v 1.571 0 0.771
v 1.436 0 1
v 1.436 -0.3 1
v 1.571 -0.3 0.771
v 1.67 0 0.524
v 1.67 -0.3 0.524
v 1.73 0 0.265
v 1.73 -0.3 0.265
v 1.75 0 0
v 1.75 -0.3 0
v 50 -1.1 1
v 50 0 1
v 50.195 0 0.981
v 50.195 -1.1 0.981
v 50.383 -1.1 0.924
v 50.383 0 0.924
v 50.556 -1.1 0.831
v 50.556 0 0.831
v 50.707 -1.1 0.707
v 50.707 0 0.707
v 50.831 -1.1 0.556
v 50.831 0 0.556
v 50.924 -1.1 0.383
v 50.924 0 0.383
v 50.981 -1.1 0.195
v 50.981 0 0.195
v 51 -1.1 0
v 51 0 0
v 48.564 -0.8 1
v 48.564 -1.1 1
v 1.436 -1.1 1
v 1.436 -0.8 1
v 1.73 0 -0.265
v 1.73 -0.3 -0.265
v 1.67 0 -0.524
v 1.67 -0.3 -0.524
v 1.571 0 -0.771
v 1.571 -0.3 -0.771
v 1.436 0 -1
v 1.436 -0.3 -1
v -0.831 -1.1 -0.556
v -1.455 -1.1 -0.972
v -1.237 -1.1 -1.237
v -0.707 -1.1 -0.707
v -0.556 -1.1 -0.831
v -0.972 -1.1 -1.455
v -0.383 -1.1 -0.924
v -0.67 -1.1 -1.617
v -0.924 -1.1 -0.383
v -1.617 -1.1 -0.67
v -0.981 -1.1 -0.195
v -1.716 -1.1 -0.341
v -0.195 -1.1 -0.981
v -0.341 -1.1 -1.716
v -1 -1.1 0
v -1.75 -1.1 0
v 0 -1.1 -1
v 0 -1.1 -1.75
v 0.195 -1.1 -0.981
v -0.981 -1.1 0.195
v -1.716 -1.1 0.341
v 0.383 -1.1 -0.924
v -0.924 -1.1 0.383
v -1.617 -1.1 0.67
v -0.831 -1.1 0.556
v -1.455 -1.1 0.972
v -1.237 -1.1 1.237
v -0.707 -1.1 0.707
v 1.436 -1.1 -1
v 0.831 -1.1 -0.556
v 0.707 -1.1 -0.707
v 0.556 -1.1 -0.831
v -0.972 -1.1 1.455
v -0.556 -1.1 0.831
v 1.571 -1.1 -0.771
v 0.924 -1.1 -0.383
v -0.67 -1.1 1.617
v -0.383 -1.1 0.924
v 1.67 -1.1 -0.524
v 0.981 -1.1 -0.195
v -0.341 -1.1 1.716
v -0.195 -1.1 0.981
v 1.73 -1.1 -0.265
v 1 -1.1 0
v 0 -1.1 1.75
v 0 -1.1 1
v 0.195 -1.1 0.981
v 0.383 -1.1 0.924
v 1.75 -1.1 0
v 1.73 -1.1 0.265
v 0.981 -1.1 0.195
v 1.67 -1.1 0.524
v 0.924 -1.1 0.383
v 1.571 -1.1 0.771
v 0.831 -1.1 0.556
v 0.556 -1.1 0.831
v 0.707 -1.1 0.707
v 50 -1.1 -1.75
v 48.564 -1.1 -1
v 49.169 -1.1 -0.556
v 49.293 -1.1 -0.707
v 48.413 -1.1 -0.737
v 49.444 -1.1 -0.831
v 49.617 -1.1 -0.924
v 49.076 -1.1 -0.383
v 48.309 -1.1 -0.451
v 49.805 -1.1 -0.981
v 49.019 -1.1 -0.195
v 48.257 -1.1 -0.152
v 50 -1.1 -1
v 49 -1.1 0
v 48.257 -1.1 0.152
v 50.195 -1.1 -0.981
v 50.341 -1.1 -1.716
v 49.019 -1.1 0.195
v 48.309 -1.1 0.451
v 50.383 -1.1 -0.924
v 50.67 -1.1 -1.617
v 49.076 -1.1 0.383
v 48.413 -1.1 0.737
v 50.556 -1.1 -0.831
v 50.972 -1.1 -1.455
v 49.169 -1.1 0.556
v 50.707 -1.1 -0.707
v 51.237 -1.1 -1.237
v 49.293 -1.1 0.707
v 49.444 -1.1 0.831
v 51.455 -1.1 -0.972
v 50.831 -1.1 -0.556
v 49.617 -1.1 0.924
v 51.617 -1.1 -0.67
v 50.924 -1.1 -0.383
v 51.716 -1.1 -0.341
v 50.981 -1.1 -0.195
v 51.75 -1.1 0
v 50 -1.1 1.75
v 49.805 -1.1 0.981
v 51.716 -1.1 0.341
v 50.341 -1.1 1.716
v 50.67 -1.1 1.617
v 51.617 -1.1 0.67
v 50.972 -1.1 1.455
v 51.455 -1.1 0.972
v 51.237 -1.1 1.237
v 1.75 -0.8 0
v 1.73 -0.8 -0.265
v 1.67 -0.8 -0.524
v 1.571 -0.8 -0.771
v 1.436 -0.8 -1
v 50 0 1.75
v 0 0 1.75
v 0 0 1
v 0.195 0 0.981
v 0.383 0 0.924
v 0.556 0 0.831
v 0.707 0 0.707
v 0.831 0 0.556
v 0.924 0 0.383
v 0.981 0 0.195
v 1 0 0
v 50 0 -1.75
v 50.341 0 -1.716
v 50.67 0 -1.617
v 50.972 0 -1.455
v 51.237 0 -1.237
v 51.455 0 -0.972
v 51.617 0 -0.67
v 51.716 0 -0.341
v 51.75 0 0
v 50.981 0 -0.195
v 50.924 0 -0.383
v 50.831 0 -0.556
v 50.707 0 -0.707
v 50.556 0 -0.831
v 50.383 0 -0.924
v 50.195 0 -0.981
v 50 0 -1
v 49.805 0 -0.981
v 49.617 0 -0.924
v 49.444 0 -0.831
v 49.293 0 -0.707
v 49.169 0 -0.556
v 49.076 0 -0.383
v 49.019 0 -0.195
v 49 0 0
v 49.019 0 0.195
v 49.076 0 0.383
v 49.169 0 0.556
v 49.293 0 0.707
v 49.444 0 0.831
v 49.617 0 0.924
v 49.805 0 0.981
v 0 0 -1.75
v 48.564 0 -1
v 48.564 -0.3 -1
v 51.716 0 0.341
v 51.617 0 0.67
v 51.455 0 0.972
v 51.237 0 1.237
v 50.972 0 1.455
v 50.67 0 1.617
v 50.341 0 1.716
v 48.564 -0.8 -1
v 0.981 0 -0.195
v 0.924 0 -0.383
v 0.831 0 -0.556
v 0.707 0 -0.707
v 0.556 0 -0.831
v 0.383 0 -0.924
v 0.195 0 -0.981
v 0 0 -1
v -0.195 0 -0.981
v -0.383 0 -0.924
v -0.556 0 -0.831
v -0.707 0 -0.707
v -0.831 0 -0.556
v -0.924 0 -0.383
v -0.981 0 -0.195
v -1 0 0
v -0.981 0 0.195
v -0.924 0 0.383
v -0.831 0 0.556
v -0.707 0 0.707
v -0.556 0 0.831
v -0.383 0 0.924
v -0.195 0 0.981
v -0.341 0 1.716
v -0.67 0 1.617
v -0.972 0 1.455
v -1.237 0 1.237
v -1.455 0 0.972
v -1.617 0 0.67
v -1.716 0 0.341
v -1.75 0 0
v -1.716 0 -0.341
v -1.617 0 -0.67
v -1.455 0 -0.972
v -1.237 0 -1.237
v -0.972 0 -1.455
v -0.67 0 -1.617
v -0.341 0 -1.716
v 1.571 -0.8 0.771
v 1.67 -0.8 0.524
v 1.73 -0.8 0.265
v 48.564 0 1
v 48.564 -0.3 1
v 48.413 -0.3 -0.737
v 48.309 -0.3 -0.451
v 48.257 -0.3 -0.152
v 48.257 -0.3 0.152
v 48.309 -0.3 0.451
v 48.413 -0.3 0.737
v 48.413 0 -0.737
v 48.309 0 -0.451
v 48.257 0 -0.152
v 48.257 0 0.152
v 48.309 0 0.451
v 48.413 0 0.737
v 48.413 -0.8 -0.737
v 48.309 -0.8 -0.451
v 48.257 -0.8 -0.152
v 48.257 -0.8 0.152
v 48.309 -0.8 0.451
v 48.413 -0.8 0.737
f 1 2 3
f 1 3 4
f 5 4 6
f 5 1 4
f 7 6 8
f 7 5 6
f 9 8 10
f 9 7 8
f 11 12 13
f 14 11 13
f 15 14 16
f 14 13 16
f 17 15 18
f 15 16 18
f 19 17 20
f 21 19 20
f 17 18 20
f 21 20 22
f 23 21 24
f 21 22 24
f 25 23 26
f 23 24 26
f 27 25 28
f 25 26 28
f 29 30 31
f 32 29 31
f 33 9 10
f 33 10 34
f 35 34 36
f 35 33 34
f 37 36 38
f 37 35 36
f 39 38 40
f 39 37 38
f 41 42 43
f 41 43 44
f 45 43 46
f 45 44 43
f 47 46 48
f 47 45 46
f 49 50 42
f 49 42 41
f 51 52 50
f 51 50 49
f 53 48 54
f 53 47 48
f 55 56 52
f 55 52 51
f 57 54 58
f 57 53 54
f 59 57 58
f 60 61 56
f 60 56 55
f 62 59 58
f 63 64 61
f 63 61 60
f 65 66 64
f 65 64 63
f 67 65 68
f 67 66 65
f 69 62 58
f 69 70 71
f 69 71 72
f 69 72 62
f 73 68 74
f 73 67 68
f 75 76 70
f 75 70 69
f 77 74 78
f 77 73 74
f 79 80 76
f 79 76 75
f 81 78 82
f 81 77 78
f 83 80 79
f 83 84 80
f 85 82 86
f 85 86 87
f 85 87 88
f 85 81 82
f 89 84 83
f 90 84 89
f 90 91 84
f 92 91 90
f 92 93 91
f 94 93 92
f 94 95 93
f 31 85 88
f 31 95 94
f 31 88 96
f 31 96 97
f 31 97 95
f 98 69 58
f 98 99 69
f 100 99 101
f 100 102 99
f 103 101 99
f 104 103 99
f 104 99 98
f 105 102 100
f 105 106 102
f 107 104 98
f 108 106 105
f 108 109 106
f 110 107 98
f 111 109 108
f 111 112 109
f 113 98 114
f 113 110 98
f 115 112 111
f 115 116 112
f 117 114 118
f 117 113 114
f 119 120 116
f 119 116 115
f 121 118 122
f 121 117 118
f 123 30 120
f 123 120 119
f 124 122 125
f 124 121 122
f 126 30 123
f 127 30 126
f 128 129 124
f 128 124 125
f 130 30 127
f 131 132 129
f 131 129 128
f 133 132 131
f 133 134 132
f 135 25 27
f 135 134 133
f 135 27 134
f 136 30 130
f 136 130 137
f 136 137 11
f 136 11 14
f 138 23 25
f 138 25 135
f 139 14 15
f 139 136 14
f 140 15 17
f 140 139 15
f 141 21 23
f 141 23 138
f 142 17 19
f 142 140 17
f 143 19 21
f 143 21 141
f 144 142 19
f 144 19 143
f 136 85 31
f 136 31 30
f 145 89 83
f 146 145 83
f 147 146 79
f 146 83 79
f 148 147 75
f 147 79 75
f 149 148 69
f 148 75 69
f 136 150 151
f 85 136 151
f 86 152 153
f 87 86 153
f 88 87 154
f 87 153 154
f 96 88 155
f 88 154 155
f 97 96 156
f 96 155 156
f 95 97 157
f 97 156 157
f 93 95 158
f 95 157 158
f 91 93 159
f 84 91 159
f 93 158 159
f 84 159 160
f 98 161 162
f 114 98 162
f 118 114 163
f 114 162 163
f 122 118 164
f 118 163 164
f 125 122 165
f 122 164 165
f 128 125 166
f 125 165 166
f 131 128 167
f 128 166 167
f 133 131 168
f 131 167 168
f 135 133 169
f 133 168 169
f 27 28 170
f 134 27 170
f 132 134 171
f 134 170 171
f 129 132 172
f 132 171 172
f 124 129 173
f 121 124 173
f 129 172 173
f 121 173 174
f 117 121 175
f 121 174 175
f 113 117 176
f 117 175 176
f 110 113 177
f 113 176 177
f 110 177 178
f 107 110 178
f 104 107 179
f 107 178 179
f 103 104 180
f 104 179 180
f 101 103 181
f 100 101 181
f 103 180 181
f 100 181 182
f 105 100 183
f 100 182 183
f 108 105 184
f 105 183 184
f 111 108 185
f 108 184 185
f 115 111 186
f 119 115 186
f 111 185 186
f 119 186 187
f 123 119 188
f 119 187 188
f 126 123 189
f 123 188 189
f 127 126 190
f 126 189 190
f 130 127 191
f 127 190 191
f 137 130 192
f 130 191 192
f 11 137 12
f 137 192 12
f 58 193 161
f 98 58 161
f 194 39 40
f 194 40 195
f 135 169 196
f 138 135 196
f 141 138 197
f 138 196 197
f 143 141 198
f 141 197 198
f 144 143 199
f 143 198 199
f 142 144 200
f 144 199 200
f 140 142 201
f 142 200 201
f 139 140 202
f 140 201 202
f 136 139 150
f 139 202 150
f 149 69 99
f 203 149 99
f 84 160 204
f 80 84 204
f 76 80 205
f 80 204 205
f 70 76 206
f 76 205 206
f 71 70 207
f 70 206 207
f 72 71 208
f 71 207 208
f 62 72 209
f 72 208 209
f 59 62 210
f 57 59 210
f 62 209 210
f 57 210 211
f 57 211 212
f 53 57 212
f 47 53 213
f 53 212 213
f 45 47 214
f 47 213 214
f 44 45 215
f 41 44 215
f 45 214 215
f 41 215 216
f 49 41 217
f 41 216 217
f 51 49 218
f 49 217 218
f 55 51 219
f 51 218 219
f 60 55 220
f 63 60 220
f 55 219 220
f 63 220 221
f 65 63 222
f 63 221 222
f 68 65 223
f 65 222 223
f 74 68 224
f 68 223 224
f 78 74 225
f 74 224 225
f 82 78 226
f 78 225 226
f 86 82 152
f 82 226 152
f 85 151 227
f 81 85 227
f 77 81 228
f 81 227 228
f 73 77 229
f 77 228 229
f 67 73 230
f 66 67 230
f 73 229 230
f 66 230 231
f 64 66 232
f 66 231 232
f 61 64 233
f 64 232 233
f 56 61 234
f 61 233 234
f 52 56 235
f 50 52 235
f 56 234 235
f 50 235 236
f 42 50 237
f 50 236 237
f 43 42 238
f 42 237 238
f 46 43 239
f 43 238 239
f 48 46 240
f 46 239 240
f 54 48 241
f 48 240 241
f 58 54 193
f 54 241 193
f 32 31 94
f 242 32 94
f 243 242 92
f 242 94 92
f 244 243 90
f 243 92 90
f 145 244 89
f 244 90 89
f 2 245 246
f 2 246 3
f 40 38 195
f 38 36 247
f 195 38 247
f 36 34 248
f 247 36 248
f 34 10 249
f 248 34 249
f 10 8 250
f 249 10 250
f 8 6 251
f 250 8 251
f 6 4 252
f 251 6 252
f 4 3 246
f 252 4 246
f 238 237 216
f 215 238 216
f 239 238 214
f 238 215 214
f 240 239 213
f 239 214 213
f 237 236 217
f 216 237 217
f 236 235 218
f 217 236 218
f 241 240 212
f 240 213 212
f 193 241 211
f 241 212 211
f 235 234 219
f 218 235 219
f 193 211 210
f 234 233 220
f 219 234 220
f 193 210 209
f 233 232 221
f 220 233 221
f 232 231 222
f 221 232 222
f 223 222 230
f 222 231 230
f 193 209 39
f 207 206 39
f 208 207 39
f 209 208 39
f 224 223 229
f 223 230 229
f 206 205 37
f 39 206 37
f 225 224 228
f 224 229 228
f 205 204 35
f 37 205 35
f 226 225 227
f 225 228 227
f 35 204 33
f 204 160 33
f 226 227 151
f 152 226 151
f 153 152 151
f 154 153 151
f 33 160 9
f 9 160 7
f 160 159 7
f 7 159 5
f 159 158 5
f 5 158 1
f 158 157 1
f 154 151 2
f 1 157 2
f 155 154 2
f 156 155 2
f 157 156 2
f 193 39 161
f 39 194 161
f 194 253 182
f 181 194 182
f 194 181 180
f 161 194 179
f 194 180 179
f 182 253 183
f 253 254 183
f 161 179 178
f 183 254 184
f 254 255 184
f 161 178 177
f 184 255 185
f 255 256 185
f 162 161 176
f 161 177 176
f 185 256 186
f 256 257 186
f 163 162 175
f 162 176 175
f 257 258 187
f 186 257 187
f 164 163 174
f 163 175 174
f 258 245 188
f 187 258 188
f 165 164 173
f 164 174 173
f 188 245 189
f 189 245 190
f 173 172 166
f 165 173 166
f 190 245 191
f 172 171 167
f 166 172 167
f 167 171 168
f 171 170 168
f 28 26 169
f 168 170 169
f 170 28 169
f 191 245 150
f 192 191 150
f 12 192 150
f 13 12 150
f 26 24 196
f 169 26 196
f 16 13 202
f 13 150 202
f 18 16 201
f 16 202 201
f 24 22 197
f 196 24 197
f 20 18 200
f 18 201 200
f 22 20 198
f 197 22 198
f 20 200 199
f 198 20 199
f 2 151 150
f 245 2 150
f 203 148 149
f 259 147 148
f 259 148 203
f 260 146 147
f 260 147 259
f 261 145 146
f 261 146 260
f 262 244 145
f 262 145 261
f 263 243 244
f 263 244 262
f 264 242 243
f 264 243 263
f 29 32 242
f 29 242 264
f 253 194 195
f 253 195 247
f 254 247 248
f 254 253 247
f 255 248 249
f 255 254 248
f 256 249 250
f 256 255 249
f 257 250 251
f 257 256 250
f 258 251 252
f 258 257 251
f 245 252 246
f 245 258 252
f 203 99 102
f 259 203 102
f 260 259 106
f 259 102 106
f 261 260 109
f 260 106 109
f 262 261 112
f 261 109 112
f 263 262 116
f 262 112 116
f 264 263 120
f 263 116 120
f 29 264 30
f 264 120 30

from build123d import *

# Parameters (mm, degrees)
F1_DEPTH = 1.1
F3_DEPTH = 0.3
F4_DEPTH = 0.3


with BuildPart() as f1:
    # F0 (on Front) → F1 (new body)
    with BuildSketch(Plane.XZ):
        with BuildLine():
            ThreePointArc((1.4361406616, -1), (0.8100925873, -1.5512092057), (0, -1.75))
            Line((0, -1.75), (25, -1.75))
            Line((25, -1.75), (25, -1))
            Line((25, -1), (1.4361406616, -1))
        make_face()
        with BuildLine():
            Line((25, -1), (25, -1.75))
            Line((25, -1.75), (50, -1.75))
            ThreePointArc((50, -1.75), (49.1899074127, -1.5512092057), (48.5638593384, -1))
            Line((48.5638593384, -1), (25, -1))
        make_face()
        with BuildLine():
            Line((48.5638593384, 1), (25, 1))
            Line((25, 1), (25, -1))
            Line((25, -1), (48.5638593384, -1))
            ThreePointArc((48.5638593384, -1), (48.25, 0), (48.5638593384, 1))
        make_face()
        with BuildLine():
            Line((50, 1.75), (25, 1.75))
            Line((25, 1.75), (25, 1))
            Line((25, 1), (48.5638593384, 1))
            ThreePointArc((48.5638593384, 1), (49.1899074127, 1.5512092057), (50, 1.75))
        make_face()
        with BuildLine():
            Line((50, 1), (48.5638593384, 1))
            ThreePointArc((48.5638593384, 1), (48.25, 0), (48.5638593384, -1))
            Line((48.5638593384, -1), (50, -1))
            ThreePointArc((50, -1), (49, 0), (50, 1))
        make_face()
        with BuildLine():
            ThreePointArc((51.75, 0), (51.2374368671, 1.2374368671), (50, 1.75))
            Line((50, 1.75), (50, 1))
            ThreePointArc((50, 1), (50.7071067812, 0.7071067812), (51, 0))
            ThreePointArc((51, 0), (50.7071067812, -0.7071067812), (50, -1))
            Line((50, -1), (50, -1.75))
            ThreePointArc((50, -1.75), (51.2374368671, -1.2374368671), (51.75, 0))
        make_face()
        with BuildLine():
            ThreePointArc((0, -1), (-1, 0), (0, 1))
            Line((0, 1), (0, 1.75))
            ThreePointArc((0, 1.75), (-1.75, 0), (0, -1.75))
            Line((0, -1.75), (0, -1))
        make_face()
        with BuildLine():
            ThreePointArc((0, 1), (0.7071067812, 0.7071067812), (1, 0))
            ThreePointArc((1, 0), (0.7071067812, -0.7071067812), (0, -1))
            Line((0, -1), (1.4361406616, -1))
            ThreePointArc((1.4361406616, -1), (1.6696925103, -0.5240485866), (1.75, 0))
            ThreePointArc((1.75, 0), (1.6696925103, 0.5240485866), (1.4361406616, 1))
            Line((1.4361406616, 1), (0, 1))
        make_face()
        with BuildLine():
            ThreePointArc((48.5638593384, -1), (49.1899074127, -1.5512092057), (50, -1.75))
            Line((50, -1.75), (50, -1))
            Line((50, -1), (48.5638593384, -1))
        make_face()
        with BuildLine():
            Line((50, 1), (50, 1.75))
            ThreePointArc((50, 1.75), (49.1899074127, 1.5512092057), (48.5638593384, 1))
            Line((48.5638593384, 1), (50, 1))
        make_face()
        with BuildLine():
            Line((25, 1), (1.4361406616, 1))
            ThreePointArc((1.4361406616, 1), (1.6696925103, 0.5240485866), (1.75, 0))
            ThreePointArc((1.75, 0), (1.6696925103, -0.5240485866), (1.4361406616, -1))
            Line((1.4361406616, -1), (25, -1))
            Line((25, -1), (25, 1))
        make_face()
        with BuildLine():
            Line((25, 1.75), (0, 1.75))
            ThreePointArc((0, 1.75), (0.8100925873, 1.5512092057), (1.4361406616, 1))
            Line((1.4361406616, 1), (25, 1))
            Line((25, 1), (25, 1.75))
        make_face()
        with BuildLine():
            Line((1.4361406616, -1), (0, -1))
            Line((0, -1), (0, -1.75))
            ThreePointArc((0, -1.75), (0.8100925873, -1.5512092057), (1.4361406616, -1))
        make_face()
        with BuildLine():
            Line((0, 1.75), (0, 1))
            Line((0, 1), (1.4361406616, 1))
            ThreePointArc((1.4361406616, 1), (0.8100925873, 1.5512092057), (0, 1.75))
        make_face()
    extrude(amount=F1_DEPTH)

    # F2 (on face) → F3 (cut)
    with BuildSketch(Plane.XZ.offset(1.1)):
        with BuildLine():
            ThreePointArc((48.5638593384, -1), (48.25, 0), (48.5638593384, 1))
            Line((48.5638593384, 1), (1.4361406616, 1))
            ThreePointArc((1.4361406616, 1), (1.6696925103, 0.5240485866), (1.75, 0))
            ThreePointArc((1.75, 0), (1.6696925103, -0.5240485866), (1.4361406616, -1))
            Line((1.4361406616, -1), (48.5638593384, -1))
        make_face()
    extrude(amount=-F3_DEPTH, mode=Mode.SUBTRACT)

    # F0 (on Front) → F4 (cut)
    with BuildSketch(Plane.XZ):
        with BuildLine():
            Line((48.5638593384, 1), (25, 1))
            Line((25, 1), (25, -1))
            Line((25, -1), (48.5638593384, -1))
            ThreePointArc((48.5638593384, -1), (48.25, 0), (48.5638593384, 1))
        make_face()
        with BuildLine():
            Line((25, 1), (1.4361406616, 1))
            ThreePointArc((1.4361406616, 1), (1.6696925103, 0.5240485866), (1.75, 0))
            ThreePointArc((1.75, 0), (1.6696925103, -0.5240485866), (1.4361406616, -1))
            Line((1.4361406616, -1), (25, -1))
            Line((25, -1), (25, 1))
        make_face()
    extrude(amount=F4_DEPTH, mode=Mode.SUBTRACT)


solid = f1.part
